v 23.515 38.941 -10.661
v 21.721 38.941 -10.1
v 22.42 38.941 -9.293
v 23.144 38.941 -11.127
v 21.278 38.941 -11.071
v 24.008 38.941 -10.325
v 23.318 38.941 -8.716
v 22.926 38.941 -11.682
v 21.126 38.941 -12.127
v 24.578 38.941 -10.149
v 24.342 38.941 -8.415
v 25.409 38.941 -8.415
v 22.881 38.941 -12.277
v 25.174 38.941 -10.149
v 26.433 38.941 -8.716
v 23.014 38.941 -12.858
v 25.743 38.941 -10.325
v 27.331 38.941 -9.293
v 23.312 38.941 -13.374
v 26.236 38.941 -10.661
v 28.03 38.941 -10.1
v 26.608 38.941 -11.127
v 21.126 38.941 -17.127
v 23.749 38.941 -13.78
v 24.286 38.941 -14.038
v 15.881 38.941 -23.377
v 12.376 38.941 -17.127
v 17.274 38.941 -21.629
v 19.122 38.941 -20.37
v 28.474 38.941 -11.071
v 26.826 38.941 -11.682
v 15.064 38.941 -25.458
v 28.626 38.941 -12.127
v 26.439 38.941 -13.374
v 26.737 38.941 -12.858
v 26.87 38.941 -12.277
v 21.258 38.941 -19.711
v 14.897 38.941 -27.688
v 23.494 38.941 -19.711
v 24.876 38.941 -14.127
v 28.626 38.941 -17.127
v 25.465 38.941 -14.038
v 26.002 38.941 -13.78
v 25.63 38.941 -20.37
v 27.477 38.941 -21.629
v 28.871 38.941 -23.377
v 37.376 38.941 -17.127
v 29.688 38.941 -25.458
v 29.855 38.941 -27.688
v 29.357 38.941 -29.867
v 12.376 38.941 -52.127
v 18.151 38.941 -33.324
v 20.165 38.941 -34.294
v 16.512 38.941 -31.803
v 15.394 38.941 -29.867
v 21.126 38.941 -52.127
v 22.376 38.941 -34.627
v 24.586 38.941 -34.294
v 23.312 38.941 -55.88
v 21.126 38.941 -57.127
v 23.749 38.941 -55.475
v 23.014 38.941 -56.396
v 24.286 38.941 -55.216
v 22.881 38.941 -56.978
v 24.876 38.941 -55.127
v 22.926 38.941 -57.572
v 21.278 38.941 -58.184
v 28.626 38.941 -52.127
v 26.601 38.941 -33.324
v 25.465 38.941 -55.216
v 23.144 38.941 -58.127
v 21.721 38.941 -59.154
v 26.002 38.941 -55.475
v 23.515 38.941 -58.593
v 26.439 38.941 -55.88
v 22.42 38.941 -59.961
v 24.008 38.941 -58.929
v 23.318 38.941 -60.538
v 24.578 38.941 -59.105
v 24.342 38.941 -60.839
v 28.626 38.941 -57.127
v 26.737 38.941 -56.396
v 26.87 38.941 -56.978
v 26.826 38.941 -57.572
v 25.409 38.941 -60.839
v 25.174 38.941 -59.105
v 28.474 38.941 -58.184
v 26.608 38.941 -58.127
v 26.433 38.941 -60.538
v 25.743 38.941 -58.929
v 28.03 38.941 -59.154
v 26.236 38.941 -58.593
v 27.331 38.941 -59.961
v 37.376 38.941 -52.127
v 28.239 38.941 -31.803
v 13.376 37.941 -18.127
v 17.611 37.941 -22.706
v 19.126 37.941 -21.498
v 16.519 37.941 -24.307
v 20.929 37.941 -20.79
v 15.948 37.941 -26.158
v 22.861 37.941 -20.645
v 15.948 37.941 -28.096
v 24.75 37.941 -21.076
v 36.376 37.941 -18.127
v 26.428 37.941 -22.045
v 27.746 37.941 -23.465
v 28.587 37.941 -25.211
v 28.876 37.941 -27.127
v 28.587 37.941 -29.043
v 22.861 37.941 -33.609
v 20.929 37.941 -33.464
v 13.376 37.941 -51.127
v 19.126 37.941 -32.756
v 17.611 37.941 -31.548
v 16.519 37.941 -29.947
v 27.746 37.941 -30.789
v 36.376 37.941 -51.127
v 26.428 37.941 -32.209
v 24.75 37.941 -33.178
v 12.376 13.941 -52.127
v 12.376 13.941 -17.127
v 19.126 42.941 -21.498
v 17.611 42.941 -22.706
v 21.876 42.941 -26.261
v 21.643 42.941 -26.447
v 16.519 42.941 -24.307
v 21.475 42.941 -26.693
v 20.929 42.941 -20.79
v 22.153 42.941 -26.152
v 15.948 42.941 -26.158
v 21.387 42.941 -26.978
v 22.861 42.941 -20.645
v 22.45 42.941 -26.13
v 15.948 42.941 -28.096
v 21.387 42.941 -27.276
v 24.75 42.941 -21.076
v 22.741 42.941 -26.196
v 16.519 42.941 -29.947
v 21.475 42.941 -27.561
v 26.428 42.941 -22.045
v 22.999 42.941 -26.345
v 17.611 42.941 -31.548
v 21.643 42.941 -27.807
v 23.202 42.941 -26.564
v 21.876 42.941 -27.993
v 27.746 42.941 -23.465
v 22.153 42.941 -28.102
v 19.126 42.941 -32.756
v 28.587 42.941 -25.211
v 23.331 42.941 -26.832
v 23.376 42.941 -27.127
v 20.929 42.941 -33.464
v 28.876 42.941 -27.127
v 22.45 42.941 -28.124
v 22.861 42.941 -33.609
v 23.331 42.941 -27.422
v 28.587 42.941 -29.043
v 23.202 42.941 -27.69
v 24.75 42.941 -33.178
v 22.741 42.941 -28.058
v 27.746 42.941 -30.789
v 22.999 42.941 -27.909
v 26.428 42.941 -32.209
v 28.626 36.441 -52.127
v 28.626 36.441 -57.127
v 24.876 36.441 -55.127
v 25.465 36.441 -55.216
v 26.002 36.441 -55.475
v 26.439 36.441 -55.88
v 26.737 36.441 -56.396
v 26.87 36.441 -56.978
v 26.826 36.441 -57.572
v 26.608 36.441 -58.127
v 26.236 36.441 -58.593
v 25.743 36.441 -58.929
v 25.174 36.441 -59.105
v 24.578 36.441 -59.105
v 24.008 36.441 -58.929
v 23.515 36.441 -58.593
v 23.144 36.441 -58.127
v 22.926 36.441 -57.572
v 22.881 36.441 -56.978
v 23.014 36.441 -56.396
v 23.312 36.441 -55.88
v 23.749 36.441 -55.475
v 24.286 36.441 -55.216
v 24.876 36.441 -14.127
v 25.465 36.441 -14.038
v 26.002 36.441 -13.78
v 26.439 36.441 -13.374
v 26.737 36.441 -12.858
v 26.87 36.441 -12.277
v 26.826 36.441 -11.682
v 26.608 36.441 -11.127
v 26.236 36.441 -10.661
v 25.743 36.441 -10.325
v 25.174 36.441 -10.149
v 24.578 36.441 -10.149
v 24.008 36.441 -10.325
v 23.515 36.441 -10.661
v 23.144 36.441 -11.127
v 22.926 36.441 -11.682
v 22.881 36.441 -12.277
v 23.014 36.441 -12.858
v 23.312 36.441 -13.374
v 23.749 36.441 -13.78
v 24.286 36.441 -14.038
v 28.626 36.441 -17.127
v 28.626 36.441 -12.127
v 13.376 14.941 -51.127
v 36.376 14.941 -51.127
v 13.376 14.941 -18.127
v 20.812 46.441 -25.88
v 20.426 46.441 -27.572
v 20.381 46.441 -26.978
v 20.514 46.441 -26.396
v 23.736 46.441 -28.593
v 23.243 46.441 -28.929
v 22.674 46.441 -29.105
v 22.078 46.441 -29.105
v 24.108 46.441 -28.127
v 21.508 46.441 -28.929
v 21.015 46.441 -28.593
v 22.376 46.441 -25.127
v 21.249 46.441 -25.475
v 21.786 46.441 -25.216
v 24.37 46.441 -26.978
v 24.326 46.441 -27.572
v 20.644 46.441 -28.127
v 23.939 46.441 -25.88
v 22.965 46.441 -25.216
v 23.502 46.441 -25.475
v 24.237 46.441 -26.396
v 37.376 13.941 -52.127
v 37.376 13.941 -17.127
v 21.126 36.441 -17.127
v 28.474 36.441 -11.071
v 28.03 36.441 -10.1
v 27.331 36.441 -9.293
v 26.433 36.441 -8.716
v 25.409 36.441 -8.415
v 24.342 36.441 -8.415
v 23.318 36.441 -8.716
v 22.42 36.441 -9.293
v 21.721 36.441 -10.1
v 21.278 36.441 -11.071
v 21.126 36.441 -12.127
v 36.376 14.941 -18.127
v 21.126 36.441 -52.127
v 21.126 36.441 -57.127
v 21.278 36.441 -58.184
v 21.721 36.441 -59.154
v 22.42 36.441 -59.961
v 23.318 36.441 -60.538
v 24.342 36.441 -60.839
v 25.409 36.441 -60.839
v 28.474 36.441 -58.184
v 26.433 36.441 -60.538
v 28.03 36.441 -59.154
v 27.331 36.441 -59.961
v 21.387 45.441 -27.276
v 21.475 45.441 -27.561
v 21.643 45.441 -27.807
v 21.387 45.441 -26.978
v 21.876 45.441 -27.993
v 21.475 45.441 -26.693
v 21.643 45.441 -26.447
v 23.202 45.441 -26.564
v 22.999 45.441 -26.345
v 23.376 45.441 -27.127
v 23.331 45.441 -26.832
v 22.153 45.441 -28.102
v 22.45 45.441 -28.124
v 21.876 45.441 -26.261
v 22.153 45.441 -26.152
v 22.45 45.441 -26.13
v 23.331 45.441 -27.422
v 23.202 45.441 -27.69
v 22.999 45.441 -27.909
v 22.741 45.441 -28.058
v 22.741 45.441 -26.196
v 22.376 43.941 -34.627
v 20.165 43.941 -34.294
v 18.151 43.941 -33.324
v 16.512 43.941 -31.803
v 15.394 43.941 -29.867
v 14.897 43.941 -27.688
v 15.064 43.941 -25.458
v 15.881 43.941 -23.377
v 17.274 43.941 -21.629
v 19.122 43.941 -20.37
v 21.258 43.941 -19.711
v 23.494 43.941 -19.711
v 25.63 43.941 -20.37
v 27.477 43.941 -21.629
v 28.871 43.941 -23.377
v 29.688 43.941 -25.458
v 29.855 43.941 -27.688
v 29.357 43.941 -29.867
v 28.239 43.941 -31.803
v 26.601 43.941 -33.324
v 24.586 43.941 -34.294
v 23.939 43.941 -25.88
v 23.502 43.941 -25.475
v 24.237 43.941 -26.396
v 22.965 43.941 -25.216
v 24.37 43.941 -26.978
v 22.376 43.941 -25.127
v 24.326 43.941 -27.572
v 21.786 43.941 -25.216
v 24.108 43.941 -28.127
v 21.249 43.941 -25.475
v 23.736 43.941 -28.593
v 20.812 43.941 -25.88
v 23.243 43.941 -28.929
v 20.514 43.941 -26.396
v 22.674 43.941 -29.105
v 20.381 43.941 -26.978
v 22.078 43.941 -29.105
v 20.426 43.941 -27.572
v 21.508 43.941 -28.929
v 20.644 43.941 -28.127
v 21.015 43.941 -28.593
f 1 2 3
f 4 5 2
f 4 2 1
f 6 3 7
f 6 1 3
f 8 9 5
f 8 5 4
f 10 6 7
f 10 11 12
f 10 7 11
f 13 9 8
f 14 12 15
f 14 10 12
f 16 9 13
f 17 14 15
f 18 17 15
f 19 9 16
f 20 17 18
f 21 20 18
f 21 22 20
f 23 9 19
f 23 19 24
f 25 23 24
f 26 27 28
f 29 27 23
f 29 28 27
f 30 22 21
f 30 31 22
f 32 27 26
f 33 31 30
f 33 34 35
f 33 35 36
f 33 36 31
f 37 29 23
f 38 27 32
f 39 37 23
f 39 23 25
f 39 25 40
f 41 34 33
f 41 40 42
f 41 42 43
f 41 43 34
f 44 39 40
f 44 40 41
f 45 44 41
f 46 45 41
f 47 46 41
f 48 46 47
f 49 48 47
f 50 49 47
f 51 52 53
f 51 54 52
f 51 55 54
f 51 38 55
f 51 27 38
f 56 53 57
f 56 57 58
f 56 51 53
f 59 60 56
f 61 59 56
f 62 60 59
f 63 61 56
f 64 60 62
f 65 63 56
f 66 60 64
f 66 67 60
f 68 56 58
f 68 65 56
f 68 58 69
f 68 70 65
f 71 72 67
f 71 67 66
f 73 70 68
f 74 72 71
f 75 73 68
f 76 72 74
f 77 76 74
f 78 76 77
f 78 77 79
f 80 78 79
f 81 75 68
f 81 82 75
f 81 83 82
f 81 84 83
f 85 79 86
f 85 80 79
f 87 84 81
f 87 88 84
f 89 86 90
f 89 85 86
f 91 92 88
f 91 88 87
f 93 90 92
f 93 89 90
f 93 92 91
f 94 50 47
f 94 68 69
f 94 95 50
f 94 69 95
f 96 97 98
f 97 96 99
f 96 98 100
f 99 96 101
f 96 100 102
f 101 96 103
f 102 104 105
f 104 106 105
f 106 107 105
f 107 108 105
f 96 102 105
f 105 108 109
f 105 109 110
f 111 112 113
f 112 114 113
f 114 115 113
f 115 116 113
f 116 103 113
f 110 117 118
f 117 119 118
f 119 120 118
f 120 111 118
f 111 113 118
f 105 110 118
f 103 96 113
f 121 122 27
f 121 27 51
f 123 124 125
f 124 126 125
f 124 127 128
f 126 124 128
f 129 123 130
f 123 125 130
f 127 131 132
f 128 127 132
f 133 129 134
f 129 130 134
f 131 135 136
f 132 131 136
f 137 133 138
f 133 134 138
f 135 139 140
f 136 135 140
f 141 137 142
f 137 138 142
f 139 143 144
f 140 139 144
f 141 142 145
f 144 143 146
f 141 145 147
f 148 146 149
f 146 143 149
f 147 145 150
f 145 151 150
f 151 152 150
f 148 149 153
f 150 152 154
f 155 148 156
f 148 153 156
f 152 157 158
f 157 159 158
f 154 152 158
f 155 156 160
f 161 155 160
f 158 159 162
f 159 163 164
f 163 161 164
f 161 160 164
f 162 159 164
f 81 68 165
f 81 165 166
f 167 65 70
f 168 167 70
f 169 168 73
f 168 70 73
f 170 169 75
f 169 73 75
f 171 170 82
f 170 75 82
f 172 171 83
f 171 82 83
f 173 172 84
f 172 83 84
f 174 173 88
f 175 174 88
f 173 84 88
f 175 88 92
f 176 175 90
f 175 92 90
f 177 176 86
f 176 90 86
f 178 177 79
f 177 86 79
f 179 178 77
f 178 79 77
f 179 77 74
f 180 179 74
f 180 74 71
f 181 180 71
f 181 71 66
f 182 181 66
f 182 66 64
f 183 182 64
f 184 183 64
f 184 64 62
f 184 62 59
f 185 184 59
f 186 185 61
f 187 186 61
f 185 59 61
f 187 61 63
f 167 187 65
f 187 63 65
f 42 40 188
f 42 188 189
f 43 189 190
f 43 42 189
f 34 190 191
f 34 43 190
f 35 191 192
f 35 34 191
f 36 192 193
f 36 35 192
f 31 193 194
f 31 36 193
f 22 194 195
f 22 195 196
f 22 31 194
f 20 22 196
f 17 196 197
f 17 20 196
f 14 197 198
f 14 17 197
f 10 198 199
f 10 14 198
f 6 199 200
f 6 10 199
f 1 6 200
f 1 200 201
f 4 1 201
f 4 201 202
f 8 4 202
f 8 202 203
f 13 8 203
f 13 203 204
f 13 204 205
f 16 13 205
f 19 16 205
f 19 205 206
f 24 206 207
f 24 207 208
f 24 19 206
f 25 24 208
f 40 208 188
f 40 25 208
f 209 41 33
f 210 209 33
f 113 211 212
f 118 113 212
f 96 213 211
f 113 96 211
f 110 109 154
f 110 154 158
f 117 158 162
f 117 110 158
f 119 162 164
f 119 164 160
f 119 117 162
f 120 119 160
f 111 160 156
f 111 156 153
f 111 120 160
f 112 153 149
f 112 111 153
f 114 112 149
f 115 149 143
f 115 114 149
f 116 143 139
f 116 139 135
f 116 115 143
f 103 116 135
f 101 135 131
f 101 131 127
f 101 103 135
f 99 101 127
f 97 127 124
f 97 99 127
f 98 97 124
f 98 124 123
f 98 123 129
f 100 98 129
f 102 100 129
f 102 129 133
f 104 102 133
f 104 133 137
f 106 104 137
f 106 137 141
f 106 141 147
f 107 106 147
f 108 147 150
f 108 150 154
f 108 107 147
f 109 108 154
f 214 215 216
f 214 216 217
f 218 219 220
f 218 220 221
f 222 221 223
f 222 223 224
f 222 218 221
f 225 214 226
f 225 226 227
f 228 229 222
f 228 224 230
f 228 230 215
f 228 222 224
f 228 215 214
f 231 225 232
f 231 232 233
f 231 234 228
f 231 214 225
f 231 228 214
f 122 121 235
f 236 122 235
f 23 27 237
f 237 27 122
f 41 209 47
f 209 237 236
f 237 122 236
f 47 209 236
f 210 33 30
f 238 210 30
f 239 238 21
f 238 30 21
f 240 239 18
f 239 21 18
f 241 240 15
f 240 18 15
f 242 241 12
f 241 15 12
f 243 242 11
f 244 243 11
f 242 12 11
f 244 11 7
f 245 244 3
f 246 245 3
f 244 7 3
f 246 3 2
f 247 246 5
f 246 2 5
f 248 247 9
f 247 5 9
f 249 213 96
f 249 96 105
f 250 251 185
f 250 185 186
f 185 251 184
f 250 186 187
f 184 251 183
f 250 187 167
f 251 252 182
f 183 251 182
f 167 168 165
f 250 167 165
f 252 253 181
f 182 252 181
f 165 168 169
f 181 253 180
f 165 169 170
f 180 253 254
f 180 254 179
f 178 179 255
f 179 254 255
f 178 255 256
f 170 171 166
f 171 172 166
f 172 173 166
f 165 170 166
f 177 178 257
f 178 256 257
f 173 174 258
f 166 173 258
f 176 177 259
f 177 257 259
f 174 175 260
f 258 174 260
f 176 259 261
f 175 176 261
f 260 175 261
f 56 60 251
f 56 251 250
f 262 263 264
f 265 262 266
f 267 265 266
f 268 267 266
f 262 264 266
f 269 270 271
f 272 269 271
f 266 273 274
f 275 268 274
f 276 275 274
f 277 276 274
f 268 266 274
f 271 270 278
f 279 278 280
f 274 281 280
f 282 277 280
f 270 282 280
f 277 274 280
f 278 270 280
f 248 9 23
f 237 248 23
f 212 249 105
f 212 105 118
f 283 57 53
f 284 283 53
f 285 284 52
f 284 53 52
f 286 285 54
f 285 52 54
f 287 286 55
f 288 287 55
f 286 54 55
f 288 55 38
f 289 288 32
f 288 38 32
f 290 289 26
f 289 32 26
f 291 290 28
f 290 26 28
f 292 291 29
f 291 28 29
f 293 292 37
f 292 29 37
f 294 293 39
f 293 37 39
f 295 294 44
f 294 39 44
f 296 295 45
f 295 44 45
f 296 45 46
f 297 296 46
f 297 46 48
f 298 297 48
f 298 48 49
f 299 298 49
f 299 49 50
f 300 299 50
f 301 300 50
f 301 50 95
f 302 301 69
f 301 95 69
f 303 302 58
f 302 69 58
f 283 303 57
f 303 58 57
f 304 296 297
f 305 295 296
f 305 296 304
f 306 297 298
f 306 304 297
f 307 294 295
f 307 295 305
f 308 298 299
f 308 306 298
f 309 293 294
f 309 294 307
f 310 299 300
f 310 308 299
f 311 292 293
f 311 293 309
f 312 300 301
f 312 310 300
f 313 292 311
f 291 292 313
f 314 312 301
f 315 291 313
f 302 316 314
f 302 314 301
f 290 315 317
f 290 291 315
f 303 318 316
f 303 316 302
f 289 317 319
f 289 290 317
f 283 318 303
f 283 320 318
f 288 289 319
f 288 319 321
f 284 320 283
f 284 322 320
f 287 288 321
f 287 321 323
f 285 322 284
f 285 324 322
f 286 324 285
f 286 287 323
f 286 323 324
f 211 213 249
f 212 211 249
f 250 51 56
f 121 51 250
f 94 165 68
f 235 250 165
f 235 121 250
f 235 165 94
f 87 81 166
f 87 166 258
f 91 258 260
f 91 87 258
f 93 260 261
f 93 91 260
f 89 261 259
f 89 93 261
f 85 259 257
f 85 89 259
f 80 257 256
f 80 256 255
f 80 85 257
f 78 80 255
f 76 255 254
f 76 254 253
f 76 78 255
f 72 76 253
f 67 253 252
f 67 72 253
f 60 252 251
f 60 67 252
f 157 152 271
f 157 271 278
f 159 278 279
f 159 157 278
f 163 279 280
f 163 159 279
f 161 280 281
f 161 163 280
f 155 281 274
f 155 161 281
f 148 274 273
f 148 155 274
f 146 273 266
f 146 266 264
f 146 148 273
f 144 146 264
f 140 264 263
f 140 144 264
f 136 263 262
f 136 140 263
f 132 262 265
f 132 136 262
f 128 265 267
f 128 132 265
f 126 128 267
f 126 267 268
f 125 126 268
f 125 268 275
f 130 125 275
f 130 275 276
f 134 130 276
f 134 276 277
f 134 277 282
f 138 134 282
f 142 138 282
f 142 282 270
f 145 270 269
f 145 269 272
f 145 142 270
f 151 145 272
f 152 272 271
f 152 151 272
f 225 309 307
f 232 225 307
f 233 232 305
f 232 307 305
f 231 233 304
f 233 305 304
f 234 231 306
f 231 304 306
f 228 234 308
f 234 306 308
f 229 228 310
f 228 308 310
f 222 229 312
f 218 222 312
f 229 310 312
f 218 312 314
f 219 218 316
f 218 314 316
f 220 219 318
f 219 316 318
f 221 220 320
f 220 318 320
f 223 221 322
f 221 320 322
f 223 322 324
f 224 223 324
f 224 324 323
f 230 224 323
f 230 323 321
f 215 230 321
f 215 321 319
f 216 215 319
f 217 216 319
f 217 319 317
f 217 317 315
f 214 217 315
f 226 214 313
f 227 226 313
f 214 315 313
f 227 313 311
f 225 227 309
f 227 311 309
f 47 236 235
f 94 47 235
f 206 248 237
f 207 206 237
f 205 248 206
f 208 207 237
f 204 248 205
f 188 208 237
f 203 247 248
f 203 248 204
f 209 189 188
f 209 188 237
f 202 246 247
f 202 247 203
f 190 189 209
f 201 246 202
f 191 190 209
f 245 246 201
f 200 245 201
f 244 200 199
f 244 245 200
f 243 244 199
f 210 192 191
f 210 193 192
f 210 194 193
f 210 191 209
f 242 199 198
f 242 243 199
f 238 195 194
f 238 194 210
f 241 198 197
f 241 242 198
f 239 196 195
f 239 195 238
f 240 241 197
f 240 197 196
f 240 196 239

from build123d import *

# Parameters (mm, degrees)
SKETCH1_W           = 50
SKETCH1_H           = 70
BOSS_EXTRUDE1_DEPTH = 50
SKETCH2_R           = 15
BOSS_EXTRUDE2_DEPTH = 10
SKETCH3_R           = 4
BOSS_EXTRUDE3_DEPTH = 5
SHELL7_START        = 2
SHELL7_OUTLINE_W    = 46
SHELL7_OUTLINE_H    = 66
SHELL7_DEPTH        = 46
SHELL7_START_2      = 48
SHELL7_2_OUTLINE_R  = 13
SHELL7_2_DEPTH      = 10
SHELL7_START_3      = 58
SHELL7_3_OUTLINE_R  = 2
SHELL7_3_DEPTH      = 5
SKETCH4_R           = 4
BOSS_EXTRUDE4_DEPTH = 5
SCALE1_SCALE        = 0.5


# Read off the part's stored shape, not the designer's step: Shell7
with BuildPart() as part:
    # Sketch1 → Boss-Extrude1 (new body)
    with BuildSketch(Plane(origin=(0, 0, 0), x_dir=(1, 0, 0), z_dir=(0, 1, 0))):
        with Locations((25, 35)):
            Rectangle(SKETCH1_W, SKETCH1_H)
    extrude(amount=BOSS_EXTRUDE1_DEPTH)

    # Sketch2 → Boss-Extrude2 (add)
    with BuildSketch(Plane(origin=(0, 50, 0), x_dir=(1, 0, 0), z_dir=(0, 1, 0))):
        with Locations(Location((20, 20, 0), (0, 0, 90))):
            Circle(SKETCH2_R)
    extrude(amount=BOSS_EXTRUDE2_DEPTH)

    # Sketch3 → Boss-Extrude3 (add)
    with BuildSketch(Plane(origin=(0, 60, 0), x_dir=(1, 0, 0), z_dir=(0, 1, 0))):
        with Locations(Location((20, 20, 0), (0, 0, 270))):
            Circle(SKETCH3_R)
    extrude(amount=BOSS_EXTRUDE3_DEPTH)

    # Shell7 outline → Shell7 (cut)
    with BuildSketch(Plane(origin=(0, 0, 0), x_dir=(1, 0, 0), z_dir=(0, 1, 0)).offset(SHELL7_START)):
        with Locations((25, 35)):
            Rectangle(SHELL7_OUTLINE_W, SHELL7_OUTLINE_H)
    extrude(amount=SHELL7_DEPTH, mode=Mode.SUBTRACT)

    # Shell7 2 outline → Shell7 2 (cut)
    with BuildSketch(Plane(origin=(0, 0, 0), x_dir=(1, 0, 0), z_dir=(0, 1, 0)).offset(SHELL7_START_2)):
        with Locations((20, 20)):
            Circle(SHELL7_2_OUTLINE_R)
    extrude(amount=SHELL7_2_DEPTH, mode=Mode.SUBTRACT)

    # Shell7 3 outline → Shell7 3 (cut)
    with BuildSketch(Plane(origin=(0, 0, 0), x_dir=(1, 0, 0), z_dir=(0, 1, 0)).offset(SHELL7_START_3)):
        with Locations((20, 20)):
            Circle(SHELL7_3_OUTLINE_R)
    extrude(amount=SHELL7_3_DEPTH, mode=Mode.SUBTRACT)

    # Sketch4 → Boss-Extrude4 (add)
    with BuildSketch(Plane(origin=(0, 50, 0), x_dir=(1, 0, 0), z_dir=(0, 1, 0))):
        with BuildLine():
            Line((17.5, 70), (32.5, 70))
            Line((32.5, 70), (32.5, 80))
            ThreePointArc((32.5, 80), (25, 87.5), (17.5, 80))
            Line((17.5, 80), (17.5, 70))
        make_face()
        with Locations(Location((25, 80, 0), (0, 0, 270))):
            Circle(SKETCH4_R, mode=Mode.SUBTRACT)
    boss_extrude4 = extrude(amount=-BOSS_EXTRUDE4_DEPTH)

    # Mirror1: Boss-Extrude4 across plane
    add(boss_extrude4.mirror(Plane(origin=(0, 0, -35), x_dir=(1, 0, 0), z_dir=(0, 0, -1))))


with BuildPart() as part_1:
    # Scale1: scaled about (24.751384616, 27.88242139, -34.254153849)
    add(part.part.scale(SCALE1_SCALE).moved(Location((12.375692308, 13.941210695, -17.127076924))))


solid = part_1.part
